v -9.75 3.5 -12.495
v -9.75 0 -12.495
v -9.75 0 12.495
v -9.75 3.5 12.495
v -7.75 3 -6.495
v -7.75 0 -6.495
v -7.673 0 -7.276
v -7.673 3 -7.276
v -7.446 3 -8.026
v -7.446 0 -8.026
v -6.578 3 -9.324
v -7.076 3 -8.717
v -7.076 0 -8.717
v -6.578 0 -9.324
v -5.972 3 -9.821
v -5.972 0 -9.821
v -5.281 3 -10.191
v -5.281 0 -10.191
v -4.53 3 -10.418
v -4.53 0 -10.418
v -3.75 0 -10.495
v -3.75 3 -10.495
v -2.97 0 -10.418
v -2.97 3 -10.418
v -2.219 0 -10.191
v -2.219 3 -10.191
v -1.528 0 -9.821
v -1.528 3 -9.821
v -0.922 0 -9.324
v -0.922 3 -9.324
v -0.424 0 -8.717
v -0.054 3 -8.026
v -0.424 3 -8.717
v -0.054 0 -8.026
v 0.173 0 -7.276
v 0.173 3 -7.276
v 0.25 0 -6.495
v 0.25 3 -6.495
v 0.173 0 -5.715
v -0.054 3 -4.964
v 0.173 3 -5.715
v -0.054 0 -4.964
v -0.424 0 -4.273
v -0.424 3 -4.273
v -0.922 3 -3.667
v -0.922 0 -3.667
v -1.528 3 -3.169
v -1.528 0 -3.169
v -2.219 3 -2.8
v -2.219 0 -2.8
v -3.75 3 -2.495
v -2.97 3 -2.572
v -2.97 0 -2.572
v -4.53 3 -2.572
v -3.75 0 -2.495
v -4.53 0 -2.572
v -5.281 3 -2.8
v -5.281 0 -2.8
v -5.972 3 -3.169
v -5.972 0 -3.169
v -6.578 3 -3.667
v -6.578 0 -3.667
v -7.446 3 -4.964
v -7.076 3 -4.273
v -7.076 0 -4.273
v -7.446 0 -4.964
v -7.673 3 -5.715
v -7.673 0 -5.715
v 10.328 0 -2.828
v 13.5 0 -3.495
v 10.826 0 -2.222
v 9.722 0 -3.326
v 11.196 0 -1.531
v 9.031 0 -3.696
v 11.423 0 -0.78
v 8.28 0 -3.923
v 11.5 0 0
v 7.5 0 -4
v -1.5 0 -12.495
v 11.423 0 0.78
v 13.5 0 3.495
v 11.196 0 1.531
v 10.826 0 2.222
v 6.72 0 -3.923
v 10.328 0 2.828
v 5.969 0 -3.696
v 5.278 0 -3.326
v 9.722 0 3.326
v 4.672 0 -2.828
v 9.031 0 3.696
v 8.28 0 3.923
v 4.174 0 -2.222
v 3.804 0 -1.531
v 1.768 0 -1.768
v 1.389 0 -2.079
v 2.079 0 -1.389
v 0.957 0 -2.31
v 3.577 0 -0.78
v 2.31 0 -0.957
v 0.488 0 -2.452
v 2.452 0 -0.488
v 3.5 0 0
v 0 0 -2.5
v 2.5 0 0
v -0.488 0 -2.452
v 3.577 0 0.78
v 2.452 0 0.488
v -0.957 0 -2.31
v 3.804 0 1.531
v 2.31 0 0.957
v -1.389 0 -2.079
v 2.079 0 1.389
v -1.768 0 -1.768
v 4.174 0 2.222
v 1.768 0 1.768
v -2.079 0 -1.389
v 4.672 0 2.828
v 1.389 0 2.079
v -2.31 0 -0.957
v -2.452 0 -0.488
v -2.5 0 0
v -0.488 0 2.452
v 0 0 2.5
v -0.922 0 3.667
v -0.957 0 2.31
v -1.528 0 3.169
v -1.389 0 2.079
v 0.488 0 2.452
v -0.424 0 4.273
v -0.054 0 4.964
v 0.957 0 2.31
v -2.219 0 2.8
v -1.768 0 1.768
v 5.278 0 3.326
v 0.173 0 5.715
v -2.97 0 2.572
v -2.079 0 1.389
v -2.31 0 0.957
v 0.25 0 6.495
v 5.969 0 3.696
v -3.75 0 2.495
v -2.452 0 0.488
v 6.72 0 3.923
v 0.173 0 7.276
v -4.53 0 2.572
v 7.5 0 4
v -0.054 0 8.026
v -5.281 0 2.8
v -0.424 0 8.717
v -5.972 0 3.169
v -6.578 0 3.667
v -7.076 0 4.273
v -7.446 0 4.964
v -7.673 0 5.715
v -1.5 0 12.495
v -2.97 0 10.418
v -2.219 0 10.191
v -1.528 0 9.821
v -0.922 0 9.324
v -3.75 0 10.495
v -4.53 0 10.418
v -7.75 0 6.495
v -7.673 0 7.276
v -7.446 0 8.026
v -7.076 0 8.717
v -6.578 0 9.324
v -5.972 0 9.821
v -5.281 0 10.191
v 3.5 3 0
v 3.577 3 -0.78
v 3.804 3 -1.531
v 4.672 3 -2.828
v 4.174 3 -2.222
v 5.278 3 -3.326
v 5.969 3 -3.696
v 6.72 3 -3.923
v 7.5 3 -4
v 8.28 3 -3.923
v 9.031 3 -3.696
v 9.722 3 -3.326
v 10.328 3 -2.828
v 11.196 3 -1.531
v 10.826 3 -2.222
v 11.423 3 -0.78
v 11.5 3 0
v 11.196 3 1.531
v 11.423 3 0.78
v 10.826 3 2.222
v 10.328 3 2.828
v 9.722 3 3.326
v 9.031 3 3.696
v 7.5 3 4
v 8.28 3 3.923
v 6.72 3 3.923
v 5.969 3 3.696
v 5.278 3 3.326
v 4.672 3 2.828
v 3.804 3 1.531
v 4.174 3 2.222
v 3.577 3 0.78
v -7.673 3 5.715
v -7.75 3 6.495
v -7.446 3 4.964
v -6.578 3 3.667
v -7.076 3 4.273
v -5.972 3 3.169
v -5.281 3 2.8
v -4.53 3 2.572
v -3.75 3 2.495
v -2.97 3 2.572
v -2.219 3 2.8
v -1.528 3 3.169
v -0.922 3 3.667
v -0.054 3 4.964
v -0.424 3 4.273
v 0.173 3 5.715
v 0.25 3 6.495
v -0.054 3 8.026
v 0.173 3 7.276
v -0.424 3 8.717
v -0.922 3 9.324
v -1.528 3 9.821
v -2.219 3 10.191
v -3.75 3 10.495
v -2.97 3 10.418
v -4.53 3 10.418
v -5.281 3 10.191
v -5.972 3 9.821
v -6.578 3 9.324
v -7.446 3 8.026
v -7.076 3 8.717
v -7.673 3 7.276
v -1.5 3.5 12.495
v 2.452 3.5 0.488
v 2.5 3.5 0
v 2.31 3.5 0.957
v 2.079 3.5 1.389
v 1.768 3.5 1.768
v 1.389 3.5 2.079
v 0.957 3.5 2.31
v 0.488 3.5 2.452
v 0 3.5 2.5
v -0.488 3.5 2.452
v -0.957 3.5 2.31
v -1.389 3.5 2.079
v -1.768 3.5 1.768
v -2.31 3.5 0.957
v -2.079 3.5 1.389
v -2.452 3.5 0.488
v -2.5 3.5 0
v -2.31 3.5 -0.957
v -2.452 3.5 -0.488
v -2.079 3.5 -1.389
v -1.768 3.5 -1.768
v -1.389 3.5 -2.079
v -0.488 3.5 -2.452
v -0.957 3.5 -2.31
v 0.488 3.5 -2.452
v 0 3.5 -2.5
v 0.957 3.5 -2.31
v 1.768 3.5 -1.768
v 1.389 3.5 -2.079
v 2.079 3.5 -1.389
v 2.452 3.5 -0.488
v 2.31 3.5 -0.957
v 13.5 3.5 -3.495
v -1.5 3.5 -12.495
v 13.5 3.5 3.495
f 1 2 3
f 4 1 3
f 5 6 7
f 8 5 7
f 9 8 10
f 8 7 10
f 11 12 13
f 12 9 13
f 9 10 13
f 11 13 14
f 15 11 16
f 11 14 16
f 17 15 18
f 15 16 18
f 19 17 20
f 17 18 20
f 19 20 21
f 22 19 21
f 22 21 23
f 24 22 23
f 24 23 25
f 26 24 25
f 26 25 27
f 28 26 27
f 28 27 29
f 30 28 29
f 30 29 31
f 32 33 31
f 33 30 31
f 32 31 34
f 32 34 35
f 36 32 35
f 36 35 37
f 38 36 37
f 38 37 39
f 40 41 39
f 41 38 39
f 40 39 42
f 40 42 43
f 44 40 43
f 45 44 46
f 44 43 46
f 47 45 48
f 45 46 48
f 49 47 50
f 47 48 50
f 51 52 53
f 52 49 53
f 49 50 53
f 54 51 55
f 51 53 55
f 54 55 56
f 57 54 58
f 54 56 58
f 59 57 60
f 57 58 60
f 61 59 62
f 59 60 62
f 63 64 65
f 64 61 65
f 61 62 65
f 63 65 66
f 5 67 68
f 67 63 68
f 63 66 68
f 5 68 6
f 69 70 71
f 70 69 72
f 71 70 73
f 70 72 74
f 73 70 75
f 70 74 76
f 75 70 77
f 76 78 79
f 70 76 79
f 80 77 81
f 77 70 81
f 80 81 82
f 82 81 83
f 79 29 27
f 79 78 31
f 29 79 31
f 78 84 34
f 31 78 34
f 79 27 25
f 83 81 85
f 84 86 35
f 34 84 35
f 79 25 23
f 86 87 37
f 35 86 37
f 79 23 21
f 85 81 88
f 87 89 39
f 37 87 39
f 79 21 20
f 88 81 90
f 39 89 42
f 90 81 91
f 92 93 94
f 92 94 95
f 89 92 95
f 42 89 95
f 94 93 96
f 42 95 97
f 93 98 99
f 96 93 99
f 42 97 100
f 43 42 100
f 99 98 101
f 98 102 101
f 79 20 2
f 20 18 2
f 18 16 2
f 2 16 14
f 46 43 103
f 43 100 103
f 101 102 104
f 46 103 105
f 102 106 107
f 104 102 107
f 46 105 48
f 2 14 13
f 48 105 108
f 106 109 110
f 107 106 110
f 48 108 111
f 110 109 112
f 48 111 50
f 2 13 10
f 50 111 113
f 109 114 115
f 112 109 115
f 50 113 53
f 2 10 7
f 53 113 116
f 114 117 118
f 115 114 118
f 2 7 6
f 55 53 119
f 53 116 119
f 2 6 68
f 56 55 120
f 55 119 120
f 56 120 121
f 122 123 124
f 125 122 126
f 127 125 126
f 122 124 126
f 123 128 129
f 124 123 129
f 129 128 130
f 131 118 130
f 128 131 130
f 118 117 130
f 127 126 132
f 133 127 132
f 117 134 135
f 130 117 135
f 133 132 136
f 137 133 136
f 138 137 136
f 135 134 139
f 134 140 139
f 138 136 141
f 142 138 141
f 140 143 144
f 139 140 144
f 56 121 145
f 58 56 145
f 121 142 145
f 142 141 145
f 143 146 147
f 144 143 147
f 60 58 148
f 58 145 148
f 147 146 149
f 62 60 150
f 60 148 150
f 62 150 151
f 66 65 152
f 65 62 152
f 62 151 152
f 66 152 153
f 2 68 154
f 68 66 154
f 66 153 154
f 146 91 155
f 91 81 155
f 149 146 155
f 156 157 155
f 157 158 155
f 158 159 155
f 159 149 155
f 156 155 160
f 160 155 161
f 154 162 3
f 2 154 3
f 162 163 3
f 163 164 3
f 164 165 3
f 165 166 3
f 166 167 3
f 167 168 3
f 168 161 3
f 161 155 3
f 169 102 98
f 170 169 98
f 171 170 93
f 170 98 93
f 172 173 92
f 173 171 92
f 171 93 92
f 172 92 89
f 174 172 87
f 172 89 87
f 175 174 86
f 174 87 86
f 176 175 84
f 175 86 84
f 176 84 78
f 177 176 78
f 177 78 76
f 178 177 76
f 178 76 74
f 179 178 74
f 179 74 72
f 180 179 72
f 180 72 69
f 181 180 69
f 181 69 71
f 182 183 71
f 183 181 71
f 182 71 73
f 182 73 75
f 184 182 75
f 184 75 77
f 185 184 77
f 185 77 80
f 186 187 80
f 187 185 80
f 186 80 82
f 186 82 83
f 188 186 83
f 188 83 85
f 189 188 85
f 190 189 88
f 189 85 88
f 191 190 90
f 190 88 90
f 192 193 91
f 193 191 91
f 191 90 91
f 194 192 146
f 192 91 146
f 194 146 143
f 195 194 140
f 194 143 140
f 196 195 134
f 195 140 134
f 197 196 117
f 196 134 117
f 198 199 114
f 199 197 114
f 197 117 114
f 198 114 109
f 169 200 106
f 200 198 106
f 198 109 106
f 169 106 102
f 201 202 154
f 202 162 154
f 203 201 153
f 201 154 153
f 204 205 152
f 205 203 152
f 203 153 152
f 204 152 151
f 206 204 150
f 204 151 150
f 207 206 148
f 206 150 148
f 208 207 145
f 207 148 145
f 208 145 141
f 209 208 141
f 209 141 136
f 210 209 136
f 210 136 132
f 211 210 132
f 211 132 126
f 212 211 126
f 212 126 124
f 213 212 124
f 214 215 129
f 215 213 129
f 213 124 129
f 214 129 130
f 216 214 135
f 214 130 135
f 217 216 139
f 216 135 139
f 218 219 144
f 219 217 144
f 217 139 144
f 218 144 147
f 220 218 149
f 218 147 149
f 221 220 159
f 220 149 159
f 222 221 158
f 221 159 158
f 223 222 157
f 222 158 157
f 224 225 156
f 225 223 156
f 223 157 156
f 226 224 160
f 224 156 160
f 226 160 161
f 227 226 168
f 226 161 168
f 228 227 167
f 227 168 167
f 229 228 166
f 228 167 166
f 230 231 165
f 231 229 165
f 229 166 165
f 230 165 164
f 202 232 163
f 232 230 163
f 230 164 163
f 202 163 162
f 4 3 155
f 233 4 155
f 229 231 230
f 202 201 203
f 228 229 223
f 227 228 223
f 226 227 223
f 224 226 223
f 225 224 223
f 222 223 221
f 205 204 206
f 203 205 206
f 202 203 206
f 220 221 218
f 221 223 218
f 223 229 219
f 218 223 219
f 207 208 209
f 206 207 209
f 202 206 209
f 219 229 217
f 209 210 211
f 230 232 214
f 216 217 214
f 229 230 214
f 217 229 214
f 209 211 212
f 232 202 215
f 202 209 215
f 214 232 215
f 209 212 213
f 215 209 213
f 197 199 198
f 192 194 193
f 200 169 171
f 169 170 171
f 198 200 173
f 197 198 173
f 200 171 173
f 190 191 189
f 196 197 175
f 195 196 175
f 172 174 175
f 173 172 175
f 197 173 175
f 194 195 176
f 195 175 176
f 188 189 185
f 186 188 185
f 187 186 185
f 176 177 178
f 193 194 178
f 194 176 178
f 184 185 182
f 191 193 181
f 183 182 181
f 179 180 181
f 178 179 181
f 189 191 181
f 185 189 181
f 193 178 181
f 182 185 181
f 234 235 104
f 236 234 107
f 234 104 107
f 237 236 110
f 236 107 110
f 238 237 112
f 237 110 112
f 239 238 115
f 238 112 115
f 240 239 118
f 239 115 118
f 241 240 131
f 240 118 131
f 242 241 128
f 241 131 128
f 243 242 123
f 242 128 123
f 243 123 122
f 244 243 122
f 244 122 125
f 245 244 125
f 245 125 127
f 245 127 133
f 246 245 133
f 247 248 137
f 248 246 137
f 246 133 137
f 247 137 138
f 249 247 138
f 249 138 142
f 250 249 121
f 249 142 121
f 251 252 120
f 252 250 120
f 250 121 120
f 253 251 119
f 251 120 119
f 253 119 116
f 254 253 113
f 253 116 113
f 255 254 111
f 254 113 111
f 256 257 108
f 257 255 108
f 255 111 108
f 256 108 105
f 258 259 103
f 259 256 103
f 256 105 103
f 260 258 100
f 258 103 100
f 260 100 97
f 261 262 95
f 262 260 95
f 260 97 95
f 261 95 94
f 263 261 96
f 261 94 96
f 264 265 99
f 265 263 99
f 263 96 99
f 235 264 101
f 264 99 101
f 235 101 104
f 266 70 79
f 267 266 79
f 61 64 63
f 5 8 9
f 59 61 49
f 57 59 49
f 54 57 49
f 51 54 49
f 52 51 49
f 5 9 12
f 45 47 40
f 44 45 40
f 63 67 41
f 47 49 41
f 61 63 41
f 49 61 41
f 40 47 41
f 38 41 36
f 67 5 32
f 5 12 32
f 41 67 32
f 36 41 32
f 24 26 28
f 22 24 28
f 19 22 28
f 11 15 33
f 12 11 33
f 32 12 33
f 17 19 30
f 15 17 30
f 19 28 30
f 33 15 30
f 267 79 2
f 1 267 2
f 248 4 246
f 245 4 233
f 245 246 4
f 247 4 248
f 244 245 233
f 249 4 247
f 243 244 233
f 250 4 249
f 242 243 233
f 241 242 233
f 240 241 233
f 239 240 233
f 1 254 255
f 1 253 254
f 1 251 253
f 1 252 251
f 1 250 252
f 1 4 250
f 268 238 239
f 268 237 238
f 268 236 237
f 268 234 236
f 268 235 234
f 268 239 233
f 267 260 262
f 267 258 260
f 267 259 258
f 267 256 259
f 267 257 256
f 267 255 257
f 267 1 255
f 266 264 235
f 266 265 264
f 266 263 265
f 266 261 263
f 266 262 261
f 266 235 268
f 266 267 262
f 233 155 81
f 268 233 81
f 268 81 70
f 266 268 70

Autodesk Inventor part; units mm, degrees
ref_plane "YZ Plane" through (0, 0, 0) normal (1, 0, 0) x (0, 1, 0)
ref_plane "XZ Plane" through (0, 0, 0) normal (0, 1, 0) x (-1, 0, 0)
ref_plane "XY Plane" through (0, 0, 0) normal (0, 0, 1) x (1, 0, 0)
sketch "Sketch1" plane through (0, 0, 0) normal (0, 1, 0) x (-1, 0, 0)
  line L0 (-13.5, -12.4952) -> (9.75, -12.4952)
  line L1 (9.75, -12.4952) -> (9.75, 12.4952)
  line L2 (9.75, 12.4952) -> (-13.5, 12.4952)
  line L3 (-13.5, 12.4952) -> (-13.5, -12.4952)
  circle A0 centre (-7.5, 0) radius 4
  circle A1 centre (3.75, -6.4952) radius 4
  circle A2 centre (3.75, 6.4952) radius 4
  line L4 (-2.75, -1.5877) -> (-2.75, 1.5877)
  line L5 (-2.75, 1.5877) -> (0, 3.1754)
  line L6 (0, 3.1754) -> (2.75, 1.5877)
  line L7 (2.75, 1.5877) -> (2.75, -1.5877)
  line L8 (2.75, -1.5877) -> (0, -3.1754)
  line L9 (0, -3.1754) -> (-2.75, -1.5877)
  circle A3 centre (0, 0) radius 7.5 construction
  dimension "d11" = 15
  dimension "d2" = 8
  dimension "d6" = 360
  dimension "d8" = 6
  dimension "d9" = 6
  dimension "d10" = 5.5
  dimension "d12" = 6
  dimension "d13" = 6
extrude "Extrusion1" add sketch "Sketch1" along normal blind 3 contours L3 L2 L1 L0 | L4 L5 L6 L7 L8 L9
sketch "Sketch2" plane through (0, 3, 0) normal (0, 1, 0) x (1, 0, 0)
  circle A0 centre (-3.75, -6.4952) radius 4 projected
  circle A1 centre (-3.75, 6.4952) radius 4 projected
  circle A2 centre (7.5, 0) radius 4 projected
  line L0 (13.5, 12.4952) -> (-9.75, 12.4952) projected
  line L1 (-9.75, 12.4952) -> (-9.75, -12.4952) projected
  line L2 (-9.75, -12.4952) -> (13.5, -12.4952) projected
  line L3 (13.5, -12.4952) -> (13.5, 12.4952) projected
  circle A3 centre (0, 0) radius 2.5
  dimension "d16" = 5
extrude "Extrusion2" add sketch "Sketch2" along normal blind 0.5 contours A0 | A1 | A2 | L3 L2 L1 L0
sketch "Sketch3" plane through (0, 0, 0) normal (0, -1, 0) x (1, 0, 0)
  circle A0 centre (-3.75, 6.4952) radius 4 projected
  circle A1 centre (-3.75, -6.4952) radius 4 projected
  circle A2 centre (7.5, 0) radius 4 projected
  line L0 (13.5, -12.4952) -> (-9.75, -12.4952) projected
  line L1 (13.5, 12.4952) -> (13.5, -12.4952) projected
  line L2 (-9.75, 12.4952) -> (13.5, 12.4952) projected
  line L3 (-9.75, -12.4952) -> (-9.75, 12.4952) construction
  line L4 (-1.5, 12.4952) -> (13.5, 3.4952)
  line L5 (13.5, 12.4952) -> (13.5, -12.4952) projected
  line L6 (13.5, -3.4952) -> (-1.5, -12.4952)
  circle A3 centre (0, 0) radius 2.5 projected
  dimension "d19" = 9
  dimension "d20" = 9
  dimension "d21" = 15
  dimension "d22" = 15
extrude "Extrusion3" cut sketch "Sketch3" against normal through all contours L4 L2 L1 | L0 L6 L1 | A3
properties part number "30_Cube_Z_Focus_Drylin_NEMA_slide_part1"
